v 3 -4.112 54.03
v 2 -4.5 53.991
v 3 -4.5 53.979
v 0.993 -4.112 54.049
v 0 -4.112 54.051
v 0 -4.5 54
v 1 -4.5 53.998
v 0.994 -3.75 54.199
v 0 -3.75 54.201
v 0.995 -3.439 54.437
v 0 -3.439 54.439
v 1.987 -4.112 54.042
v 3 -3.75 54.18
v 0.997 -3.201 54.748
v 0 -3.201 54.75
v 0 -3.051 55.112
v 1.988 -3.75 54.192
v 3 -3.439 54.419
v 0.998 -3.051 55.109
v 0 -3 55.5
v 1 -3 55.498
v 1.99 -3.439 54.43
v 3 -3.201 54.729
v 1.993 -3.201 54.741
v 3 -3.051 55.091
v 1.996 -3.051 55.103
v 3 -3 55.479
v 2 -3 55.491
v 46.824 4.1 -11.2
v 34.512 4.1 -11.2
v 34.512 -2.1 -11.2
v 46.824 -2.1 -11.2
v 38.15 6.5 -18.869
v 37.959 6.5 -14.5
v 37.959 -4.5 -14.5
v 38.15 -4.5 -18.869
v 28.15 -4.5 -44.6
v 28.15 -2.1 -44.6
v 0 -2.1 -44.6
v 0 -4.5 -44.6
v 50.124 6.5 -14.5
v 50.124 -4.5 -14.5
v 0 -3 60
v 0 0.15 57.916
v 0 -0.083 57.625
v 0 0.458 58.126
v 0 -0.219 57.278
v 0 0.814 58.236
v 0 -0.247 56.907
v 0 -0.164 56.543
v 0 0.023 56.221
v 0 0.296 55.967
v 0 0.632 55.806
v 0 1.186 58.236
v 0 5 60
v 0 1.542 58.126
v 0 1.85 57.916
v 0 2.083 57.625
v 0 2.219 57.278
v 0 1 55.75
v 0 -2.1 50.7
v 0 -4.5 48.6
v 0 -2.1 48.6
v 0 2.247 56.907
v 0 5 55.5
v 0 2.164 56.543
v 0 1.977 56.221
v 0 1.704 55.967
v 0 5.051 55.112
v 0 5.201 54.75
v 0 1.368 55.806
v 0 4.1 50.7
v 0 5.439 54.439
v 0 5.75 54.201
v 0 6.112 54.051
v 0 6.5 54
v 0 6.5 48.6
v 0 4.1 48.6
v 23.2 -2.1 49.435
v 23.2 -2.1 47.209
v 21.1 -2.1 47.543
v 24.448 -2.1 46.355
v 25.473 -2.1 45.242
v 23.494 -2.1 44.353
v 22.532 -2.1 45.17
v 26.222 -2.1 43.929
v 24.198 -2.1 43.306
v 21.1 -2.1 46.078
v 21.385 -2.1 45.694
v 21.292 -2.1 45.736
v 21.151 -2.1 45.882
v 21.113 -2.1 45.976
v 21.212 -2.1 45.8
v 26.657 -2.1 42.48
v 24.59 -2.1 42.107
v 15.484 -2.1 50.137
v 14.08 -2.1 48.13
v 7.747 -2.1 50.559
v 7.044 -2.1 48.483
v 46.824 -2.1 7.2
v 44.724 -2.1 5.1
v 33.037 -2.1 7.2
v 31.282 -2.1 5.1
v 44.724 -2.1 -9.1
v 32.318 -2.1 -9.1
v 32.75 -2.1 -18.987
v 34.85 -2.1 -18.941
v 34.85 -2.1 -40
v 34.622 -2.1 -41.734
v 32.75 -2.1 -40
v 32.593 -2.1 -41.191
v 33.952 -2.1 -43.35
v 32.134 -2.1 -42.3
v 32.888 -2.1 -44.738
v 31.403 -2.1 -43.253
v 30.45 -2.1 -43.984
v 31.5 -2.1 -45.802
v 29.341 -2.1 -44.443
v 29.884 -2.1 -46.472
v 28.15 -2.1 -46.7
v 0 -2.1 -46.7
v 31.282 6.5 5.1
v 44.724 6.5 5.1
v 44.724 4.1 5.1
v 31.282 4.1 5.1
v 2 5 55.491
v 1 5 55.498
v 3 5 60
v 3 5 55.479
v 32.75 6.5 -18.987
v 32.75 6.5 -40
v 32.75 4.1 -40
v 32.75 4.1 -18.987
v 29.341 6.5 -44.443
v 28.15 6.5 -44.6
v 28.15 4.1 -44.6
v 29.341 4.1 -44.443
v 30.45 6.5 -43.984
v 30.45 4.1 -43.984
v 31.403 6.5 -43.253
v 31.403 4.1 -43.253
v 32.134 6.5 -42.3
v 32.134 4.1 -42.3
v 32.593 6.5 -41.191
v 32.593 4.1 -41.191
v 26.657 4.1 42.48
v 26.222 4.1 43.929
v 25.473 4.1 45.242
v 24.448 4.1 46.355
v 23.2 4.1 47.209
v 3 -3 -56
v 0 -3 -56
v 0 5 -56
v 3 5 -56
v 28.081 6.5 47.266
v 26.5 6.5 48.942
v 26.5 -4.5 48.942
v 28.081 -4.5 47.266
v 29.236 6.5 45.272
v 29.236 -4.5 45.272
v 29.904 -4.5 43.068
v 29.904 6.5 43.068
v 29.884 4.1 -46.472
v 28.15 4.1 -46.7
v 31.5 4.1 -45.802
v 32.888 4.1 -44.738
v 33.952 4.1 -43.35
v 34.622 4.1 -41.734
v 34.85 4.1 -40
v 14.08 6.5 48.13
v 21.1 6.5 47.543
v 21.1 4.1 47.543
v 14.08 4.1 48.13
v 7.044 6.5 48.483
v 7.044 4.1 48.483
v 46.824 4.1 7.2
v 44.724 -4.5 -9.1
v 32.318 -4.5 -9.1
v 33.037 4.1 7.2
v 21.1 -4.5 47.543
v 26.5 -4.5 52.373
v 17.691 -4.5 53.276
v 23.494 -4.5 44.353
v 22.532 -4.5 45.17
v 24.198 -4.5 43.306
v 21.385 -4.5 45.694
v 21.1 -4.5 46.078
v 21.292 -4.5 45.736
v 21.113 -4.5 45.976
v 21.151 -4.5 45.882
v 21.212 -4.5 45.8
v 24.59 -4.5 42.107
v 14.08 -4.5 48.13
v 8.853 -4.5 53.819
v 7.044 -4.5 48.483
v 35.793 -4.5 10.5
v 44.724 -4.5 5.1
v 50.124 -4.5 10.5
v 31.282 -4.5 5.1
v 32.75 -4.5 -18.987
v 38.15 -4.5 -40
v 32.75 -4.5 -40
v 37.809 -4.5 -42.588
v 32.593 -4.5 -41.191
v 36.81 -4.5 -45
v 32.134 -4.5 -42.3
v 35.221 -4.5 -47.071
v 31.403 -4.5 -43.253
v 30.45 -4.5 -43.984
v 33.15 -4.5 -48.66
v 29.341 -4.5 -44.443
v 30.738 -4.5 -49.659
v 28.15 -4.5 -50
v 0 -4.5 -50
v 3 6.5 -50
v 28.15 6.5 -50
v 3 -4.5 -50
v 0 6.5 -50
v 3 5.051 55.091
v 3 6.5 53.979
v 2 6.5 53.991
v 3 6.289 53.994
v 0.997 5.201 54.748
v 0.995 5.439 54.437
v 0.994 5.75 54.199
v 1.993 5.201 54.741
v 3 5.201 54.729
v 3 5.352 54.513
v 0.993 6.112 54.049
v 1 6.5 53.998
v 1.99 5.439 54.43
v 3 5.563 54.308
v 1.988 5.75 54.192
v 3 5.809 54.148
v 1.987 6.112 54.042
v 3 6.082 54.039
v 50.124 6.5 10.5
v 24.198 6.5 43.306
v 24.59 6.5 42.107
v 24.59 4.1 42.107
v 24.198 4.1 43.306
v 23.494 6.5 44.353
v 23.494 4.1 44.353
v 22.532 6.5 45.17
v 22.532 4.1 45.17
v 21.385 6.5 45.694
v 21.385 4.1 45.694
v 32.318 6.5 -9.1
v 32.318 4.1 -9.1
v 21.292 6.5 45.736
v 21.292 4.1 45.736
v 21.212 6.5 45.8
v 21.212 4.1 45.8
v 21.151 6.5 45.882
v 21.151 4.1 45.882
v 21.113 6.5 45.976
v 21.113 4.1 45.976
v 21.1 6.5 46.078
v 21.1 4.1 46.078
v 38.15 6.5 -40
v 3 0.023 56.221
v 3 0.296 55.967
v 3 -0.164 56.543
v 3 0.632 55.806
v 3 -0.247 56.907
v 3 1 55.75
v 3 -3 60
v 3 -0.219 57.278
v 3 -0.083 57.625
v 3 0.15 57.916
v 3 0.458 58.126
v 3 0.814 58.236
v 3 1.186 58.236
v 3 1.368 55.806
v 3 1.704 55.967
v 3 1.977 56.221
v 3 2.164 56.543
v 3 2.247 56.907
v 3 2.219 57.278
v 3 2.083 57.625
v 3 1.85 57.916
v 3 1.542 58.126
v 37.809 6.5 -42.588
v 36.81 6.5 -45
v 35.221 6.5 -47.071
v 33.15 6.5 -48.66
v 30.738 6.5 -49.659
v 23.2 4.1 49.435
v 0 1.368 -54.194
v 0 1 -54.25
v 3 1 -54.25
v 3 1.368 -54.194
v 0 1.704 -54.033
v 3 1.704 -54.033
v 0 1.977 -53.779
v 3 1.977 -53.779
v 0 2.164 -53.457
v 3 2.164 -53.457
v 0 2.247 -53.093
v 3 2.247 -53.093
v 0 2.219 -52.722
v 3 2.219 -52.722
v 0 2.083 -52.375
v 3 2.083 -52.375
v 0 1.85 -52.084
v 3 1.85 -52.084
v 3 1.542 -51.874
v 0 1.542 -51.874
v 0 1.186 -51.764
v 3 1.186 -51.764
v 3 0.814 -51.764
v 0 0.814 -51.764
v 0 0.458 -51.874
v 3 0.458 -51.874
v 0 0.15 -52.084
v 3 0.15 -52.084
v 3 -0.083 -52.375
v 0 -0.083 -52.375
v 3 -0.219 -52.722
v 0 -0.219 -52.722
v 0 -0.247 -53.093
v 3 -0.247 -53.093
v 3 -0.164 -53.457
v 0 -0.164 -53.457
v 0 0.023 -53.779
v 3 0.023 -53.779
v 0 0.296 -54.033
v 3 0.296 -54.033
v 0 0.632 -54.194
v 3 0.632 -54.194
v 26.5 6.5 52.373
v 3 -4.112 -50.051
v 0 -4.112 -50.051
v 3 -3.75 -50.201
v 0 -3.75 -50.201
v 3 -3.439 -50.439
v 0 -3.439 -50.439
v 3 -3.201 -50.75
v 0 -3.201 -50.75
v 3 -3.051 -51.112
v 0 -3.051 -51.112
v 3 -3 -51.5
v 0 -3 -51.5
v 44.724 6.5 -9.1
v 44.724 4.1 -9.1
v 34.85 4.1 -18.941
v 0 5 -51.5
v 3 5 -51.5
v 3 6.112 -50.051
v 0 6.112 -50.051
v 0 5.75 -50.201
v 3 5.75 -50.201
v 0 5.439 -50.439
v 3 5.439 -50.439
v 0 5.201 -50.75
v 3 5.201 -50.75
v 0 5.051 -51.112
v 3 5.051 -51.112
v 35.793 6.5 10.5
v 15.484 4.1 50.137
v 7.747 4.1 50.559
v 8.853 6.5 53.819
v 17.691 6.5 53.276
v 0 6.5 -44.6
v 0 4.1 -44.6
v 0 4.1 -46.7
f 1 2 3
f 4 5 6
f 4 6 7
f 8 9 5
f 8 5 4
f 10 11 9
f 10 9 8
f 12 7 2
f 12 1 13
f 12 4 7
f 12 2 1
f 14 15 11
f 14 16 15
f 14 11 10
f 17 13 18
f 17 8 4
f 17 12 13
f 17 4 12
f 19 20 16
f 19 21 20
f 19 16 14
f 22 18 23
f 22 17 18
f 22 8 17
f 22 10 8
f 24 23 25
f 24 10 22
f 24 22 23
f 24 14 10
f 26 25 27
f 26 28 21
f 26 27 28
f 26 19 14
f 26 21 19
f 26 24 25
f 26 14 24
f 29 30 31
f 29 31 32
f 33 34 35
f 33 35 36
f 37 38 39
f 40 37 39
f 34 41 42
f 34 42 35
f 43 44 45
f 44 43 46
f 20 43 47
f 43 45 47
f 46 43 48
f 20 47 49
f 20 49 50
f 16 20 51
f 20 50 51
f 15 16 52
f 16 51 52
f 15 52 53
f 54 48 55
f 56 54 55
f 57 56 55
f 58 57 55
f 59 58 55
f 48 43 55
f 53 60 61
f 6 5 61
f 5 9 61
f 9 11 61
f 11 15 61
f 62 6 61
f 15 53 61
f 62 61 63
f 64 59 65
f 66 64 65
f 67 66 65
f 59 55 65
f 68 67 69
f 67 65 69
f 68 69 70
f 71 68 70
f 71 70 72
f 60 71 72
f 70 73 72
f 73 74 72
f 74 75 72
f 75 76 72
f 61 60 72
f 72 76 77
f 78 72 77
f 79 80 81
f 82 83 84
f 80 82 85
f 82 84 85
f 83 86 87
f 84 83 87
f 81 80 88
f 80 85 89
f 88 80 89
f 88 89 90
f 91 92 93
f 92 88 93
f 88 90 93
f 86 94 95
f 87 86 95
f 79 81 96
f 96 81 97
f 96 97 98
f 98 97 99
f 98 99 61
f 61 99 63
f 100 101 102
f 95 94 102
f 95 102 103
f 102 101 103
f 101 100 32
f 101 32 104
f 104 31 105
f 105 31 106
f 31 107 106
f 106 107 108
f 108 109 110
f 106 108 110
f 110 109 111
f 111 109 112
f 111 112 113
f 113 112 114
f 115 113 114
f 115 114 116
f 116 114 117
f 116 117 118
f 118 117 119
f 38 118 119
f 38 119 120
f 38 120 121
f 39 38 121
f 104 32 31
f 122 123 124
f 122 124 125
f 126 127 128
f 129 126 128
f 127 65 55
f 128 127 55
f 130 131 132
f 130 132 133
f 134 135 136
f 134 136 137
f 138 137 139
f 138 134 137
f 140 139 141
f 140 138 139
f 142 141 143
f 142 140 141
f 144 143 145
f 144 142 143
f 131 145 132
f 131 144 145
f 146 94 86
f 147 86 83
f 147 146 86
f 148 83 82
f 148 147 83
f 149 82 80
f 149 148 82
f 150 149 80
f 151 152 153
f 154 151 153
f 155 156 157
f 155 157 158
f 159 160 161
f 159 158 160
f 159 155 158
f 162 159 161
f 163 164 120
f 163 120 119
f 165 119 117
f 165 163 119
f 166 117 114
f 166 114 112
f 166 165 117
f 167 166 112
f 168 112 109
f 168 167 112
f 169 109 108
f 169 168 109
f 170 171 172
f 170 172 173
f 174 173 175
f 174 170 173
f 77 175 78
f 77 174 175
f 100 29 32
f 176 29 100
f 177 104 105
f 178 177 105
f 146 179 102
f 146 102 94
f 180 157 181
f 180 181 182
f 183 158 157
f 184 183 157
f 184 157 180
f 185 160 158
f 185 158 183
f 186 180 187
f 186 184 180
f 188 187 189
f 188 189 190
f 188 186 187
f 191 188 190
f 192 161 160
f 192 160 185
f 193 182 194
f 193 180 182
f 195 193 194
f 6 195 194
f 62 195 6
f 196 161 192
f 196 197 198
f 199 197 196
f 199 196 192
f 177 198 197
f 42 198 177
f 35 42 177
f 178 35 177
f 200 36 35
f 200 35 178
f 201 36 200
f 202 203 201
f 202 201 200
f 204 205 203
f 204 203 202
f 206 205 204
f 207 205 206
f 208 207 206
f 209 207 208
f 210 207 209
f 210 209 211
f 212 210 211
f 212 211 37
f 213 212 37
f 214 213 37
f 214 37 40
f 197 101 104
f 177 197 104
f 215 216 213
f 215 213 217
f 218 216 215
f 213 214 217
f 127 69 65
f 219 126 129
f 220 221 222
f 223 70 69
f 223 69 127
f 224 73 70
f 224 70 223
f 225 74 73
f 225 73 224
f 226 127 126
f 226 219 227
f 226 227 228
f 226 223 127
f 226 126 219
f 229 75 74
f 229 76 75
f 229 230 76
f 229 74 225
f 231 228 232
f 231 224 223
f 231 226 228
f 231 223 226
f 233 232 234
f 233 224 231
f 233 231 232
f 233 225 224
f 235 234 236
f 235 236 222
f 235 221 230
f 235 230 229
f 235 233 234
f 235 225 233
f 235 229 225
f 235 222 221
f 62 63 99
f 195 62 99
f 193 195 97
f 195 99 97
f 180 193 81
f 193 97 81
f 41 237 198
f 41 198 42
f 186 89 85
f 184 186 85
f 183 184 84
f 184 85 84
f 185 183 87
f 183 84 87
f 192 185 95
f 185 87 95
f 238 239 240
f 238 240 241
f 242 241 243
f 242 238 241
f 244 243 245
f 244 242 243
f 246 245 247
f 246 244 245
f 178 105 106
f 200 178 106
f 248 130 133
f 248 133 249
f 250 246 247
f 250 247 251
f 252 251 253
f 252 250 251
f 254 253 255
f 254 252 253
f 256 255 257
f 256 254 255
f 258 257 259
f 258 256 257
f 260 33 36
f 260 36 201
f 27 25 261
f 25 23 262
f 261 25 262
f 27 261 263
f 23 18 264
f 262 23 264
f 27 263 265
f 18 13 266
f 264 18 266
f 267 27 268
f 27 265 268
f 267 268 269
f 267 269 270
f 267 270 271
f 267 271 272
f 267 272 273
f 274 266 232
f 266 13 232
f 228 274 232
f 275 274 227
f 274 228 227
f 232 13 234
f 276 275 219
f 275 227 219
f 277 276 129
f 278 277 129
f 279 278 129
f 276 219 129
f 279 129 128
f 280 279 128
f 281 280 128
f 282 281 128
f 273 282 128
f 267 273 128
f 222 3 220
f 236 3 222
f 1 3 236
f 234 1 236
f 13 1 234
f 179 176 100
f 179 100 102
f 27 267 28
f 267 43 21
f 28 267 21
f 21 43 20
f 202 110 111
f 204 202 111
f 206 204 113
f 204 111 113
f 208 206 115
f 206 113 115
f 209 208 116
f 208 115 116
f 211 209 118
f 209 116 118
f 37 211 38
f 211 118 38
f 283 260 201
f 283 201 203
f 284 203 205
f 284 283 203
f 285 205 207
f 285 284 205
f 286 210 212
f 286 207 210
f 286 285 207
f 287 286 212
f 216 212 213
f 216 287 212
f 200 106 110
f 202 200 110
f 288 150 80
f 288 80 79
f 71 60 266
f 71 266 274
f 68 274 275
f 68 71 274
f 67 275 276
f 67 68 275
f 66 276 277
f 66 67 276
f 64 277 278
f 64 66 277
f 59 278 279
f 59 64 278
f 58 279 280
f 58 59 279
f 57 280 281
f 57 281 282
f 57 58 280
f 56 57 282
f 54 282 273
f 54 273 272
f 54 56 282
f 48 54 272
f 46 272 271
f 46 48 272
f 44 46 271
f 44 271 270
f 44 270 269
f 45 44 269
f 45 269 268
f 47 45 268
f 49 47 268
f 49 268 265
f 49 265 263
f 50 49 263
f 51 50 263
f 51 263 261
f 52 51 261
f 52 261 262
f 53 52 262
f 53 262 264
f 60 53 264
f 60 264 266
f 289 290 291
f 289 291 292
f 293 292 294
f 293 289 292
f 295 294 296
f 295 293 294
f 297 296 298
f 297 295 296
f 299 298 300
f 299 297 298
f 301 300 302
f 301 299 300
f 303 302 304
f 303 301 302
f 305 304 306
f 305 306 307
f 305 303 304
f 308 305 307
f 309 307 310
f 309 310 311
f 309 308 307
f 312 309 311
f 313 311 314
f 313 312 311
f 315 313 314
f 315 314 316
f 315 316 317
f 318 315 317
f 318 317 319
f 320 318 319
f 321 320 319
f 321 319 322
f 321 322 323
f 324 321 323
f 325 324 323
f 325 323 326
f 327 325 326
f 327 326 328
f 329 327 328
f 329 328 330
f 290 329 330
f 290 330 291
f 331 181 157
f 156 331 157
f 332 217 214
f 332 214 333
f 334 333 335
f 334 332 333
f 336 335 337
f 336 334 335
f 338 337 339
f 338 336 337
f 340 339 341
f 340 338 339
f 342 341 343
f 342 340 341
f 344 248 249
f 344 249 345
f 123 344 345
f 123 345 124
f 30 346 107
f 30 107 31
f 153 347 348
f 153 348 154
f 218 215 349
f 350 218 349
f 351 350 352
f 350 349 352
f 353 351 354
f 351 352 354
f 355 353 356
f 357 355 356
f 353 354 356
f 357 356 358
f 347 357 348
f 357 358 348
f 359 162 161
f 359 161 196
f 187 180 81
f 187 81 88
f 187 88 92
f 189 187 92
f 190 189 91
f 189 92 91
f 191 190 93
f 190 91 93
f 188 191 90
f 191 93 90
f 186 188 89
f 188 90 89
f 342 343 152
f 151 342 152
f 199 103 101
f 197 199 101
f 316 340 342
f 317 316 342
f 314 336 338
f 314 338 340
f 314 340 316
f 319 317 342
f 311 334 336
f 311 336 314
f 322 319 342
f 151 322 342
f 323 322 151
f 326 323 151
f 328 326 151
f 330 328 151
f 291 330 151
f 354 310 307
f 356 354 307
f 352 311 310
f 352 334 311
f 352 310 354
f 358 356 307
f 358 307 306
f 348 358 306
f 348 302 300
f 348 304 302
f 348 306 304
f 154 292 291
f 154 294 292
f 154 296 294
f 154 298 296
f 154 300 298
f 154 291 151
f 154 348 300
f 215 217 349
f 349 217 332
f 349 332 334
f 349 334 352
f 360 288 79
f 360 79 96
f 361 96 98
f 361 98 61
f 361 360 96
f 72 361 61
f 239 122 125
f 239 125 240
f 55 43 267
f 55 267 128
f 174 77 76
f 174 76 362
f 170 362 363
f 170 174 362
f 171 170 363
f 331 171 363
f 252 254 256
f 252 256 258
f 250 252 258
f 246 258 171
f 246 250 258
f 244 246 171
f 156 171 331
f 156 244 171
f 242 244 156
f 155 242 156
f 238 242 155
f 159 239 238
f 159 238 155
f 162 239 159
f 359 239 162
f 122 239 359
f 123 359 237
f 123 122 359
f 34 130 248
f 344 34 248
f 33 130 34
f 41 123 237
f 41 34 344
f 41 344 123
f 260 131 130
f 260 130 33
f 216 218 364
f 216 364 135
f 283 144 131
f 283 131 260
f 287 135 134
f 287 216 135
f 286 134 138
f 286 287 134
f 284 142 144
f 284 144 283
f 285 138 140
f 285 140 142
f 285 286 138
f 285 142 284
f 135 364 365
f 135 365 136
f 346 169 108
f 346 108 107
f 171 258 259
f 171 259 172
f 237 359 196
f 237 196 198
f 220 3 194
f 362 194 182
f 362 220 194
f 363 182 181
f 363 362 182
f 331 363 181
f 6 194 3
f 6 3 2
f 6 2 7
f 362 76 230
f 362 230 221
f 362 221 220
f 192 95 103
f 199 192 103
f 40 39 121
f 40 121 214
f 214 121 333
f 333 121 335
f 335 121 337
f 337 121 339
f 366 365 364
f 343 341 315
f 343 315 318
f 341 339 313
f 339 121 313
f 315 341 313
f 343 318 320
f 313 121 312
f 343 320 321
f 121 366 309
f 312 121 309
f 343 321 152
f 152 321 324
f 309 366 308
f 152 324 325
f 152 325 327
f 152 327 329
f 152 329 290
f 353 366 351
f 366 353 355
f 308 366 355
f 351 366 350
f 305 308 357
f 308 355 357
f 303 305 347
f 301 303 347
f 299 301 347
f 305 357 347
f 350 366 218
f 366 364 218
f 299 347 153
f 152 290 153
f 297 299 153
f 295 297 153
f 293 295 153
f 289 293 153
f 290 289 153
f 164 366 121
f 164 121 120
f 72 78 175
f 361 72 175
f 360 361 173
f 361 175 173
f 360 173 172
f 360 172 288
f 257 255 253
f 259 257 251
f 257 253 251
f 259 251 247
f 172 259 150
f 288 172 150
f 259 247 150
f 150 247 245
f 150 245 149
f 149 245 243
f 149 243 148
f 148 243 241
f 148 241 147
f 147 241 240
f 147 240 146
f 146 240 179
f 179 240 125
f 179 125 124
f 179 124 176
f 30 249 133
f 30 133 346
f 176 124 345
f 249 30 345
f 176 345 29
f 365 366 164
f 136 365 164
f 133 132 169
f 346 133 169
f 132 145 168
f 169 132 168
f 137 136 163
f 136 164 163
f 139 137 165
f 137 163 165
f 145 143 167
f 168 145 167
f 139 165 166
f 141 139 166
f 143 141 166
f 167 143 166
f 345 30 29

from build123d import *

# Parameters (mm, degrees)
BOSS_EXTRUDE1_DEPTH      = 4.5
CUT_EXTRUDE3_DEPTH       = 2.1
BOSS_EXTRUDE3_START      = 6.5
BOSS_EXTRUDE3_DEPTH      = 6.5
CUT_EXTRUDE4_START       = 4.1
CUT_EXTRUDE4_DEPTH       = 4.1
BOSS_EXTRUDE4_DEPTH      = 3
BOSS_EXTRUDE4_DEPTH_BACK = 3
SKETCH4_R                = 1.25
SKETCH4_W                = 6
SKETCH4_H                = 8
FILLET1_R                = 1.5
SKETCH5_W                = 150
SKETCH5_H                = 40
CUT_EXTRUDE5_DEPTH       = 79.451654949


with BuildPart() as part:
    # Sketch2 → Boss-Extrude1 (new body)
    with BuildSketch(Plane(origin=(0, 0, 0), x_dir=(1, 0, 0), z_dir=(0, 1, 0))):
        with BuildLine():
            Line((-28.15, 50), (28.15, 50))
            ThreePointArc((28.15, 50), (35.221067812, 47.071067812), (38.15, 40))
            Line((38.15, 40), (38.15, 18.869079534))
            Line((38.15, 18.869079534), (37.959241868, 14.5))
            Line((37.959241868, 14.5), (50.123967842, 14.5))
            Line((50.123967842, 14.5), (50.123967842, -10.5))
            Line((50.123967842, -10.5), (35.7933894, -10.5))
            Line((35.7933894, -10.5), (29.904245688, -43.067652969))
            ThreePointArc((29.904245688, -43.067652969), (28.715879749, -46.302425464), (26.5, -48.941713937))
            Line((26.5, -48.941713937), (26.5, -52.373001444))
            ThreePointArc((26.5, -52.373001444), (0, -54), (-26.5, -52.373001444))
            Line((-26.5, -52.373001444), (-26.5, -48.941713937))
            ThreePointArc((-26.5, -48.941713937), (-28.715879749, -46.302425464), (-29.904245688, -43.067652969))
            Line((-29.904245688, -43.067652969), (-35.7933894, -10.5))
            Line((-35.7933894, -10.5), (-50.123967842, -10.5))
            Line((-50.123967842, -10.5), (-50.123967842, 14.5))
            Line((-50.123967842, 14.5), (-37.959241868, 14.5))
            Line((-37.959241868, 14.5), (-38.15, 18.869079534))
            Line((-38.15, 18.869079534), (-38.15, 40))
            ThreePointArc((-38.15, 40), (-35.221067812, 47.071067812), (-28.15, 50))
        make_face()
        with BuildLine():
            Line((-32.75, 40), (-32.75, 18.986907953))
            Line((-32.75, 18.986907953), (-32.318328276, 9.1))
            Line((-32.318328276, 9.1), (-44.723967842, 9.1))
            Line((-44.723967842, 9.1), (-44.723967842, -5.1))
            Line((-44.723967842, -5.1), (-31.282284108, -5.1))
            Line((-31.282284108, -5.1), (-24.590424569, -42.106765297))
            ThreePointArc((-24.590424569, -42.106765297), (-23.494161062, -44.35301053), (-21.385106897, -45.694391107))
            ThreePointArc((-21.385106897, -45.694391107), (-21.179097179, -45.838743936), (-21.1, -46.077535434))
            Line((-21.1, -46.077535434), (-21.1, -47.543481521))
            ThreePointArc((-21.1, -47.543481521), (0, -48.6), (21.1, -47.543481521))
            Line((21.1, -47.543481521), (21.1, -46.077535434))
            ThreePointArc((21.1, -46.077535434), (21.179097179, -45.838743936), (21.385106897, -45.694391107))
            ThreePointArc((21.385106897, -45.694391107), (23.494161062, -44.35301053), (24.590424569, -42.106765297))
            Line((24.590424569, -42.106765297), (31.282284108, -5.1))
            Line((31.282284108, -5.1), (44.723967842, -5.1))
            Line((44.723967842, -5.1), (44.723967842, 9.1))
            Line((44.723967842, 9.1), (32.318328276, 9.1))
            Line((32.318328276, 9.1), (32.75, 18.986907953))
            Line((32.75, 18.986907953), (32.75, 40))
            ThreePointArc((32.75, 40), (31.402691193, 43.252691193), (28.15, 44.6))
            Line((28.15, 44.6), (-28.15, 44.6))
            ThreePointArc((-28.15, 44.6), (-31.402691193, 43.252691193), (-32.75, 40))
        make_face(mode=Mode.SUBTRACT)
    extrude(amount=-BOSS_EXTRUDE1_DEPTH)

    # Sketch2<6> → Cut-Extrude3 (cut)
    with BuildSketch(Plane(origin=(0, 0, 0), x_dir=(1, 0, 0), z_dir=(0, 1, 0))):
        with BuildLine():
            Line((-28.15, 46.7), (28.15, 46.7))
            ThreePointArc((28.15, 46.7), (32.887615434, 44.737615434), (34.85, 40))
            Line((34.85, 40), (34.85, 18.94108579))
            Line((34.85, 18.94108579), (34.512016895, 11.2))
            Line((34.512016895, 11.2), (46.823967842, 11.2))
            Line((46.823967842, 11.2), (46.823967842, -7.2))
            Line((46.823967842, -7.2), (33.036602833, -7.2))
            Line((33.036602833, -7.2), (26.656910559, -42.480443836))
            ThreePointArc((26.656910559, -42.480443836), (25.472544462, -45.242453785), (23.2, -47.208913466))
            Line((23.2, -47.208913466), (23.2, -49.434698257))
            ThreePointArc((23.2, -49.434698257), (0, -50.7), (-23.2, -49.434698257))
            Line((-23.2, -49.434698257), (-23.2, -47.208913466))
            ThreePointArc((-23.2, -47.208913466), (-25.472544462, -45.242453785), (-26.656910559, -42.480443836))
            Line((-26.656910559, -42.480443836), (-33.036602833, -7.2))
            Line((-33.036602833, -7.2), (-46.823967842, -7.2))
            Line((-46.823967842, -7.2), (-46.823967842, 11.2))
            Line((-46.823967842, 11.2), (-34.512016895, 11.2))
            Line((-34.512016895, 11.2), (-34.85, 18.94108579))
            Line((-34.85, 18.94108579), (-34.85, 40))
            ThreePointArc((-34.85, 40), (-32.887615434, 44.737615434), (-28.15, 46.7))
        make_face()
    extrude(amount=-CUT_EXTRUDE3_DEPTH, mode=Mode.SUBTRACT)

    # Sketch2<7> → Boss-Extrude3 (add)
    with BuildSketch(Plane(origin=(0, 0, 0), x_dir=(1, 0, 0), z_dir=(0, 1, 0)).offset(BOSS_EXTRUDE3_START)):
        with BuildLine():
            Line((28.15, 50), (-28.15, 50))
            ThreePointArc((-28.15, 50), (-35.221067812, 47.071067812), (-38.15, 40))
            Line((-38.15, 40), (-38.15, 18.869079534))
            Line((-38.15, 18.869079534), (-37.959241868, 14.5))
            Line((-37.959241868, 14.5), (-50.123967842, 14.5))
            Line((-50.123967842, 14.5), (-50.123967842, -10.5))
            Line((-50.123967842, -10.5), (-35.7933894, -10.5))
            Line((-35.7933894, -10.5), (-29.904245688, -43.067652969))
            ThreePointArc((-29.904245688, -43.067652969), (-28.715879749, -46.302425464), (-26.5, -48.941713937))
            Line((-26.5, -48.941713937), (-26.5, -52.373001444))
            ThreePointArc((-26.5, -52.373001444), (0, -54), (26.5, -52.373001444))
            Line((26.5, -52.373001444), (26.5, -48.941713937))
            ThreePointArc((26.5, -48.941713937), (28.715879749, -46.302425464), (29.904245688, -43.067652969))
            Line((29.904245688, -43.067652969), (35.7933894, -10.5))
            Line((35.7933894, -10.5), (50.123967842, -10.5))
            Line((50.123967842, -10.5), (50.123967842, 14.5))
            Line((50.123967842, 14.5), (37.959241868, 14.5))
            Line((37.959241868, 14.5), (38.15, 18.869079534))
            Line((38.15, 18.869079534), (38.15, 40))
            ThreePointArc((38.15, 40), (35.221067812, 47.071067812), (28.15, 50))
        make_face()
        with BuildLine():
            Line((-44.723967842, 9.1), (-32.318328276, 9.1))
            Line((-32.318328276, 9.1), (-32.75, 18.986907953))
            Line((-32.75, 18.986907953), (-32.75, 40))
            ThreePointArc((-32.75, 40), (-31.402691193, 43.252691193), (-28.15, 44.6))
            Line((-28.15, 44.6), (28.15, 44.6))
            ThreePointArc((28.15, 44.6), (31.402691193, 43.252691193), (32.75, 40))
            Line((32.75, 40), (32.75, 18.986907953))
            Line((32.75, 18.986907953), (32.318328276, 9.1))
            Line((32.318328276, 9.1), (44.723967842, 9.1))
            Line((44.723967842, 9.1), (44.723967842, -5.1))
            Line((44.723967842, -5.1), (31.282284108, -5.1))
            Line((31.282284108, -5.1), (24.590424569, -42.106765297))
            ThreePointArc((24.590424569, -42.106765297), (23.494161062, -44.35301053), (21.385106897, -45.694391107))
            ThreePointArc((21.385106897, -45.694391107), (21.179097179, -45.838743936), (21.1, -46.077535434))
            Line((21.1, -46.077535434), (21.1, -47.543481521))
            ThreePointArc((21.1, -47.543481521), (0, -48.6), (-21.1, -47.543481521))
            Line((-21.1, -47.543481521), (-21.1, -46.077535434))
            ThreePointArc((-21.1, -46.077535434), (-21.179097179, -45.838743936), (-21.385106897, -45.694391107))
            ThreePointArc((-21.385106897, -45.694391107), (-23.494161062, -44.35301053), (-24.590424569, -42.106765297))
            Line((-24.590424569, -42.106765297), (-31.282284108, -5.1))
            Line((-31.282284108, -5.1), (-44.723967842, -5.1))
            Line((-44.723967842, -5.1), (-44.723967842, 9.1))
        make_face(mode=Mode.SUBTRACT)
    extrude(amount=-BOSS_EXTRUDE3_DEPTH)

    # Sketch2<8> → Cut-Extrude4 (cut)
    with BuildSketch(Plane(origin=(0, 0, 0), x_dir=(1, 0, 0), z_dir=(0, 1, 0)).offset(CUT_EXTRUDE4_START)):
        with BuildLine():
            Line((28.15, 46.7), (-28.15, 46.7))
            ThreePointArc((-28.15, 46.7), (-32.887615434, 44.737615434), (-34.85, 40))
            Line((-34.85, 40), (-34.85, 18.94108579))
            Line((-34.85, 18.94108579), (-34.512016895, 11.2))
            Line((-34.512016895, 11.2), (-46.823967842, 11.2))
            Line((-46.823967842, 11.2), (-46.823967842, -7.2))
            Line((-46.823967842, -7.2), (-33.036602833, -7.2))
            Line((-33.036602833, -7.2), (-26.656910559, -42.480443836))
            ThreePointArc((-26.656910559, -42.480443836), (-25.472544462, -45.242453785), (-23.2, -47.208913466))
            Line((-23.2, -47.208913466), (-23.2, -49.434698257))
            ThreePointArc((-23.2, -49.434698257), (0, -50.7), (23.2, -49.434698257))
            Line((23.2, -49.434698257), (23.2, -47.208913466))
            ThreePointArc((23.2, -47.208913466), (25.472544462, -45.242453785), (26.656910559, -42.480443836))
            Line((26.656910559, -42.480443836), (33.036602833, -7.2))
            Line((33.036602833, -7.2), (46.823967842, -7.2))
            Line((46.823967842, -7.2), (46.823967842, 11.2))
            Line((46.823967842, 11.2), (34.512016895, 11.2))
            Line((34.512016895, 11.2), (34.85, 18.94108579))
            Line((34.85, 18.94108579), (34.85, 40))
            ThreePointArc((34.85, 40), (32.887615434, 44.737615434), (28.15, 46.7))
        make_face()
        with BuildLine():
            Line((-32.75, 18.986907953), (-32.75, 40))
            ThreePointArc((-32.75, 40), (-31.402691193, 43.252691193), (-28.15, 44.6))
            Line((-28.15, 44.6), (28.15, 44.6))
            ThreePointArc((28.15, 44.6), (31.402691193, 43.252691193), (32.75, 40))
            Line((32.75, 40), (32.75, 18.986907953))
            Line((32.75, 18.986907953), (32.318328276, 9.1))
            Line((32.318328276, 9.1), (44.723967842, 9.1))
            Line((44.723967842, 9.1), (44.723967842, -5.1))
            Line((44.723967842, -5.1), (31.282284108, -5.1))
            Line((31.282284108, -5.1), (24.590424569, -42.106765297))
            ThreePointArc((24.590424569, -42.106765297), (23.494161062, -44.35301053), (21.385106897, -45.694391107))
            ThreePointArc((21.385106897, -45.694391107), (21.179097179, -45.838743936), (21.1, -46.077535434))
            Line((21.1, -46.077535434), (21.1, -47.543481521))
            ThreePointArc((21.1, -47.543481521), (0, -48.6), (-21.1, -47.543481521))
            Line((-21.1, -47.543481521), (-21.1, -46.077535434))
            ThreePointArc((-21.1, -46.077535434), (-21.179097179, -45.838743936), (-21.385106897, -45.694391107))
            ThreePointArc((-21.385106897, -45.694391107), (-23.494161062, -44.35301053), (-24.590424569, -42.106765297))
            Line((-24.590424569, -42.106765297), (-31.282284108, -5.1))
            Line((-31.282284108, -5.1), (-44.723967842, -5.1))
            Line((-44.723967842, -5.1), (-44.723967842, 9.1))
            Line((-44.723967842, 9.1), (-32.318328276, 9.1))
            Line((-32.318328276, 9.1), (-32.75, 18.986907953))
        make_face(mode=Mode.SUBTRACT)
    extrude(amount=-CUT_EXTRUDE4_DEPTH, mode=Mode.SUBTRACT)

    # Sketch4 → Boss-Extrude4 (add, two sides: drawn at the far end of the back side and taken through both)
    # profile 1 of 2: a face of its own
    with BuildSketch(Plane(origin=(0, 0, 0), x_dir=(0, 0, -1), z_dir=(1, 0, 0)).offset(-BOSS_EXTRUDE4_DEPTH_BACK)):
        Polygon((-52, 5), (-52, -3), (-54, -3), (-60, -3), (-60, 5), (-54, 5), align=None)
        with Locations((-57, 1)):
            Circle(SKETCH4_R, mode=Mode.SUBTRACT)
    # profile 2 of 2: a face of its own
    with BuildSketch(Plane(origin=(0, 0, 0), x_dir=(0, 0, -1), z_dir=(1, 0, 0)).offset(-BOSS_EXTRUDE4_DEPTH_BACK)):
        with Locations((53, 1)):
            Rectangle(SKETCH4_W, SKETCH4_H)
        with Locations((53, 1)):
            Circle(SKETCH4_R, mode=Mode.SUBTRACT)
    extrude(amount=BOSS_EXTRUDE4_DEPTH + BOSS_EXTRUDE4_DEPTH_BACK)

    # Fillet1
    fillet1_edges = [part.edges().sort_by_distance(p)[0] for p in [
        (0, 5, 54),
        (0, -3, 54),
        (0, -3, -50),
        (0, 5, -50),
    ]]
    fillet(fillet1_edges, radius=FILLET1_R - 0.0001)  # a hair under: the kernel refuses the full size

    # Sketch5 → Cut-Extrude5 (cut, through all)
    with BuildSketch(Plane(origin=(0, 0, 0), x_dir=(0, 0, -1), z_dir=(1, 0, 0))):
        Rectangle(SKETCH5_W, SKETCH5_H)
    extrude(amount=-CUT_EXTRUDE5_DEPTH, mode=Mode.SUBTRACT)


solid = part.part
